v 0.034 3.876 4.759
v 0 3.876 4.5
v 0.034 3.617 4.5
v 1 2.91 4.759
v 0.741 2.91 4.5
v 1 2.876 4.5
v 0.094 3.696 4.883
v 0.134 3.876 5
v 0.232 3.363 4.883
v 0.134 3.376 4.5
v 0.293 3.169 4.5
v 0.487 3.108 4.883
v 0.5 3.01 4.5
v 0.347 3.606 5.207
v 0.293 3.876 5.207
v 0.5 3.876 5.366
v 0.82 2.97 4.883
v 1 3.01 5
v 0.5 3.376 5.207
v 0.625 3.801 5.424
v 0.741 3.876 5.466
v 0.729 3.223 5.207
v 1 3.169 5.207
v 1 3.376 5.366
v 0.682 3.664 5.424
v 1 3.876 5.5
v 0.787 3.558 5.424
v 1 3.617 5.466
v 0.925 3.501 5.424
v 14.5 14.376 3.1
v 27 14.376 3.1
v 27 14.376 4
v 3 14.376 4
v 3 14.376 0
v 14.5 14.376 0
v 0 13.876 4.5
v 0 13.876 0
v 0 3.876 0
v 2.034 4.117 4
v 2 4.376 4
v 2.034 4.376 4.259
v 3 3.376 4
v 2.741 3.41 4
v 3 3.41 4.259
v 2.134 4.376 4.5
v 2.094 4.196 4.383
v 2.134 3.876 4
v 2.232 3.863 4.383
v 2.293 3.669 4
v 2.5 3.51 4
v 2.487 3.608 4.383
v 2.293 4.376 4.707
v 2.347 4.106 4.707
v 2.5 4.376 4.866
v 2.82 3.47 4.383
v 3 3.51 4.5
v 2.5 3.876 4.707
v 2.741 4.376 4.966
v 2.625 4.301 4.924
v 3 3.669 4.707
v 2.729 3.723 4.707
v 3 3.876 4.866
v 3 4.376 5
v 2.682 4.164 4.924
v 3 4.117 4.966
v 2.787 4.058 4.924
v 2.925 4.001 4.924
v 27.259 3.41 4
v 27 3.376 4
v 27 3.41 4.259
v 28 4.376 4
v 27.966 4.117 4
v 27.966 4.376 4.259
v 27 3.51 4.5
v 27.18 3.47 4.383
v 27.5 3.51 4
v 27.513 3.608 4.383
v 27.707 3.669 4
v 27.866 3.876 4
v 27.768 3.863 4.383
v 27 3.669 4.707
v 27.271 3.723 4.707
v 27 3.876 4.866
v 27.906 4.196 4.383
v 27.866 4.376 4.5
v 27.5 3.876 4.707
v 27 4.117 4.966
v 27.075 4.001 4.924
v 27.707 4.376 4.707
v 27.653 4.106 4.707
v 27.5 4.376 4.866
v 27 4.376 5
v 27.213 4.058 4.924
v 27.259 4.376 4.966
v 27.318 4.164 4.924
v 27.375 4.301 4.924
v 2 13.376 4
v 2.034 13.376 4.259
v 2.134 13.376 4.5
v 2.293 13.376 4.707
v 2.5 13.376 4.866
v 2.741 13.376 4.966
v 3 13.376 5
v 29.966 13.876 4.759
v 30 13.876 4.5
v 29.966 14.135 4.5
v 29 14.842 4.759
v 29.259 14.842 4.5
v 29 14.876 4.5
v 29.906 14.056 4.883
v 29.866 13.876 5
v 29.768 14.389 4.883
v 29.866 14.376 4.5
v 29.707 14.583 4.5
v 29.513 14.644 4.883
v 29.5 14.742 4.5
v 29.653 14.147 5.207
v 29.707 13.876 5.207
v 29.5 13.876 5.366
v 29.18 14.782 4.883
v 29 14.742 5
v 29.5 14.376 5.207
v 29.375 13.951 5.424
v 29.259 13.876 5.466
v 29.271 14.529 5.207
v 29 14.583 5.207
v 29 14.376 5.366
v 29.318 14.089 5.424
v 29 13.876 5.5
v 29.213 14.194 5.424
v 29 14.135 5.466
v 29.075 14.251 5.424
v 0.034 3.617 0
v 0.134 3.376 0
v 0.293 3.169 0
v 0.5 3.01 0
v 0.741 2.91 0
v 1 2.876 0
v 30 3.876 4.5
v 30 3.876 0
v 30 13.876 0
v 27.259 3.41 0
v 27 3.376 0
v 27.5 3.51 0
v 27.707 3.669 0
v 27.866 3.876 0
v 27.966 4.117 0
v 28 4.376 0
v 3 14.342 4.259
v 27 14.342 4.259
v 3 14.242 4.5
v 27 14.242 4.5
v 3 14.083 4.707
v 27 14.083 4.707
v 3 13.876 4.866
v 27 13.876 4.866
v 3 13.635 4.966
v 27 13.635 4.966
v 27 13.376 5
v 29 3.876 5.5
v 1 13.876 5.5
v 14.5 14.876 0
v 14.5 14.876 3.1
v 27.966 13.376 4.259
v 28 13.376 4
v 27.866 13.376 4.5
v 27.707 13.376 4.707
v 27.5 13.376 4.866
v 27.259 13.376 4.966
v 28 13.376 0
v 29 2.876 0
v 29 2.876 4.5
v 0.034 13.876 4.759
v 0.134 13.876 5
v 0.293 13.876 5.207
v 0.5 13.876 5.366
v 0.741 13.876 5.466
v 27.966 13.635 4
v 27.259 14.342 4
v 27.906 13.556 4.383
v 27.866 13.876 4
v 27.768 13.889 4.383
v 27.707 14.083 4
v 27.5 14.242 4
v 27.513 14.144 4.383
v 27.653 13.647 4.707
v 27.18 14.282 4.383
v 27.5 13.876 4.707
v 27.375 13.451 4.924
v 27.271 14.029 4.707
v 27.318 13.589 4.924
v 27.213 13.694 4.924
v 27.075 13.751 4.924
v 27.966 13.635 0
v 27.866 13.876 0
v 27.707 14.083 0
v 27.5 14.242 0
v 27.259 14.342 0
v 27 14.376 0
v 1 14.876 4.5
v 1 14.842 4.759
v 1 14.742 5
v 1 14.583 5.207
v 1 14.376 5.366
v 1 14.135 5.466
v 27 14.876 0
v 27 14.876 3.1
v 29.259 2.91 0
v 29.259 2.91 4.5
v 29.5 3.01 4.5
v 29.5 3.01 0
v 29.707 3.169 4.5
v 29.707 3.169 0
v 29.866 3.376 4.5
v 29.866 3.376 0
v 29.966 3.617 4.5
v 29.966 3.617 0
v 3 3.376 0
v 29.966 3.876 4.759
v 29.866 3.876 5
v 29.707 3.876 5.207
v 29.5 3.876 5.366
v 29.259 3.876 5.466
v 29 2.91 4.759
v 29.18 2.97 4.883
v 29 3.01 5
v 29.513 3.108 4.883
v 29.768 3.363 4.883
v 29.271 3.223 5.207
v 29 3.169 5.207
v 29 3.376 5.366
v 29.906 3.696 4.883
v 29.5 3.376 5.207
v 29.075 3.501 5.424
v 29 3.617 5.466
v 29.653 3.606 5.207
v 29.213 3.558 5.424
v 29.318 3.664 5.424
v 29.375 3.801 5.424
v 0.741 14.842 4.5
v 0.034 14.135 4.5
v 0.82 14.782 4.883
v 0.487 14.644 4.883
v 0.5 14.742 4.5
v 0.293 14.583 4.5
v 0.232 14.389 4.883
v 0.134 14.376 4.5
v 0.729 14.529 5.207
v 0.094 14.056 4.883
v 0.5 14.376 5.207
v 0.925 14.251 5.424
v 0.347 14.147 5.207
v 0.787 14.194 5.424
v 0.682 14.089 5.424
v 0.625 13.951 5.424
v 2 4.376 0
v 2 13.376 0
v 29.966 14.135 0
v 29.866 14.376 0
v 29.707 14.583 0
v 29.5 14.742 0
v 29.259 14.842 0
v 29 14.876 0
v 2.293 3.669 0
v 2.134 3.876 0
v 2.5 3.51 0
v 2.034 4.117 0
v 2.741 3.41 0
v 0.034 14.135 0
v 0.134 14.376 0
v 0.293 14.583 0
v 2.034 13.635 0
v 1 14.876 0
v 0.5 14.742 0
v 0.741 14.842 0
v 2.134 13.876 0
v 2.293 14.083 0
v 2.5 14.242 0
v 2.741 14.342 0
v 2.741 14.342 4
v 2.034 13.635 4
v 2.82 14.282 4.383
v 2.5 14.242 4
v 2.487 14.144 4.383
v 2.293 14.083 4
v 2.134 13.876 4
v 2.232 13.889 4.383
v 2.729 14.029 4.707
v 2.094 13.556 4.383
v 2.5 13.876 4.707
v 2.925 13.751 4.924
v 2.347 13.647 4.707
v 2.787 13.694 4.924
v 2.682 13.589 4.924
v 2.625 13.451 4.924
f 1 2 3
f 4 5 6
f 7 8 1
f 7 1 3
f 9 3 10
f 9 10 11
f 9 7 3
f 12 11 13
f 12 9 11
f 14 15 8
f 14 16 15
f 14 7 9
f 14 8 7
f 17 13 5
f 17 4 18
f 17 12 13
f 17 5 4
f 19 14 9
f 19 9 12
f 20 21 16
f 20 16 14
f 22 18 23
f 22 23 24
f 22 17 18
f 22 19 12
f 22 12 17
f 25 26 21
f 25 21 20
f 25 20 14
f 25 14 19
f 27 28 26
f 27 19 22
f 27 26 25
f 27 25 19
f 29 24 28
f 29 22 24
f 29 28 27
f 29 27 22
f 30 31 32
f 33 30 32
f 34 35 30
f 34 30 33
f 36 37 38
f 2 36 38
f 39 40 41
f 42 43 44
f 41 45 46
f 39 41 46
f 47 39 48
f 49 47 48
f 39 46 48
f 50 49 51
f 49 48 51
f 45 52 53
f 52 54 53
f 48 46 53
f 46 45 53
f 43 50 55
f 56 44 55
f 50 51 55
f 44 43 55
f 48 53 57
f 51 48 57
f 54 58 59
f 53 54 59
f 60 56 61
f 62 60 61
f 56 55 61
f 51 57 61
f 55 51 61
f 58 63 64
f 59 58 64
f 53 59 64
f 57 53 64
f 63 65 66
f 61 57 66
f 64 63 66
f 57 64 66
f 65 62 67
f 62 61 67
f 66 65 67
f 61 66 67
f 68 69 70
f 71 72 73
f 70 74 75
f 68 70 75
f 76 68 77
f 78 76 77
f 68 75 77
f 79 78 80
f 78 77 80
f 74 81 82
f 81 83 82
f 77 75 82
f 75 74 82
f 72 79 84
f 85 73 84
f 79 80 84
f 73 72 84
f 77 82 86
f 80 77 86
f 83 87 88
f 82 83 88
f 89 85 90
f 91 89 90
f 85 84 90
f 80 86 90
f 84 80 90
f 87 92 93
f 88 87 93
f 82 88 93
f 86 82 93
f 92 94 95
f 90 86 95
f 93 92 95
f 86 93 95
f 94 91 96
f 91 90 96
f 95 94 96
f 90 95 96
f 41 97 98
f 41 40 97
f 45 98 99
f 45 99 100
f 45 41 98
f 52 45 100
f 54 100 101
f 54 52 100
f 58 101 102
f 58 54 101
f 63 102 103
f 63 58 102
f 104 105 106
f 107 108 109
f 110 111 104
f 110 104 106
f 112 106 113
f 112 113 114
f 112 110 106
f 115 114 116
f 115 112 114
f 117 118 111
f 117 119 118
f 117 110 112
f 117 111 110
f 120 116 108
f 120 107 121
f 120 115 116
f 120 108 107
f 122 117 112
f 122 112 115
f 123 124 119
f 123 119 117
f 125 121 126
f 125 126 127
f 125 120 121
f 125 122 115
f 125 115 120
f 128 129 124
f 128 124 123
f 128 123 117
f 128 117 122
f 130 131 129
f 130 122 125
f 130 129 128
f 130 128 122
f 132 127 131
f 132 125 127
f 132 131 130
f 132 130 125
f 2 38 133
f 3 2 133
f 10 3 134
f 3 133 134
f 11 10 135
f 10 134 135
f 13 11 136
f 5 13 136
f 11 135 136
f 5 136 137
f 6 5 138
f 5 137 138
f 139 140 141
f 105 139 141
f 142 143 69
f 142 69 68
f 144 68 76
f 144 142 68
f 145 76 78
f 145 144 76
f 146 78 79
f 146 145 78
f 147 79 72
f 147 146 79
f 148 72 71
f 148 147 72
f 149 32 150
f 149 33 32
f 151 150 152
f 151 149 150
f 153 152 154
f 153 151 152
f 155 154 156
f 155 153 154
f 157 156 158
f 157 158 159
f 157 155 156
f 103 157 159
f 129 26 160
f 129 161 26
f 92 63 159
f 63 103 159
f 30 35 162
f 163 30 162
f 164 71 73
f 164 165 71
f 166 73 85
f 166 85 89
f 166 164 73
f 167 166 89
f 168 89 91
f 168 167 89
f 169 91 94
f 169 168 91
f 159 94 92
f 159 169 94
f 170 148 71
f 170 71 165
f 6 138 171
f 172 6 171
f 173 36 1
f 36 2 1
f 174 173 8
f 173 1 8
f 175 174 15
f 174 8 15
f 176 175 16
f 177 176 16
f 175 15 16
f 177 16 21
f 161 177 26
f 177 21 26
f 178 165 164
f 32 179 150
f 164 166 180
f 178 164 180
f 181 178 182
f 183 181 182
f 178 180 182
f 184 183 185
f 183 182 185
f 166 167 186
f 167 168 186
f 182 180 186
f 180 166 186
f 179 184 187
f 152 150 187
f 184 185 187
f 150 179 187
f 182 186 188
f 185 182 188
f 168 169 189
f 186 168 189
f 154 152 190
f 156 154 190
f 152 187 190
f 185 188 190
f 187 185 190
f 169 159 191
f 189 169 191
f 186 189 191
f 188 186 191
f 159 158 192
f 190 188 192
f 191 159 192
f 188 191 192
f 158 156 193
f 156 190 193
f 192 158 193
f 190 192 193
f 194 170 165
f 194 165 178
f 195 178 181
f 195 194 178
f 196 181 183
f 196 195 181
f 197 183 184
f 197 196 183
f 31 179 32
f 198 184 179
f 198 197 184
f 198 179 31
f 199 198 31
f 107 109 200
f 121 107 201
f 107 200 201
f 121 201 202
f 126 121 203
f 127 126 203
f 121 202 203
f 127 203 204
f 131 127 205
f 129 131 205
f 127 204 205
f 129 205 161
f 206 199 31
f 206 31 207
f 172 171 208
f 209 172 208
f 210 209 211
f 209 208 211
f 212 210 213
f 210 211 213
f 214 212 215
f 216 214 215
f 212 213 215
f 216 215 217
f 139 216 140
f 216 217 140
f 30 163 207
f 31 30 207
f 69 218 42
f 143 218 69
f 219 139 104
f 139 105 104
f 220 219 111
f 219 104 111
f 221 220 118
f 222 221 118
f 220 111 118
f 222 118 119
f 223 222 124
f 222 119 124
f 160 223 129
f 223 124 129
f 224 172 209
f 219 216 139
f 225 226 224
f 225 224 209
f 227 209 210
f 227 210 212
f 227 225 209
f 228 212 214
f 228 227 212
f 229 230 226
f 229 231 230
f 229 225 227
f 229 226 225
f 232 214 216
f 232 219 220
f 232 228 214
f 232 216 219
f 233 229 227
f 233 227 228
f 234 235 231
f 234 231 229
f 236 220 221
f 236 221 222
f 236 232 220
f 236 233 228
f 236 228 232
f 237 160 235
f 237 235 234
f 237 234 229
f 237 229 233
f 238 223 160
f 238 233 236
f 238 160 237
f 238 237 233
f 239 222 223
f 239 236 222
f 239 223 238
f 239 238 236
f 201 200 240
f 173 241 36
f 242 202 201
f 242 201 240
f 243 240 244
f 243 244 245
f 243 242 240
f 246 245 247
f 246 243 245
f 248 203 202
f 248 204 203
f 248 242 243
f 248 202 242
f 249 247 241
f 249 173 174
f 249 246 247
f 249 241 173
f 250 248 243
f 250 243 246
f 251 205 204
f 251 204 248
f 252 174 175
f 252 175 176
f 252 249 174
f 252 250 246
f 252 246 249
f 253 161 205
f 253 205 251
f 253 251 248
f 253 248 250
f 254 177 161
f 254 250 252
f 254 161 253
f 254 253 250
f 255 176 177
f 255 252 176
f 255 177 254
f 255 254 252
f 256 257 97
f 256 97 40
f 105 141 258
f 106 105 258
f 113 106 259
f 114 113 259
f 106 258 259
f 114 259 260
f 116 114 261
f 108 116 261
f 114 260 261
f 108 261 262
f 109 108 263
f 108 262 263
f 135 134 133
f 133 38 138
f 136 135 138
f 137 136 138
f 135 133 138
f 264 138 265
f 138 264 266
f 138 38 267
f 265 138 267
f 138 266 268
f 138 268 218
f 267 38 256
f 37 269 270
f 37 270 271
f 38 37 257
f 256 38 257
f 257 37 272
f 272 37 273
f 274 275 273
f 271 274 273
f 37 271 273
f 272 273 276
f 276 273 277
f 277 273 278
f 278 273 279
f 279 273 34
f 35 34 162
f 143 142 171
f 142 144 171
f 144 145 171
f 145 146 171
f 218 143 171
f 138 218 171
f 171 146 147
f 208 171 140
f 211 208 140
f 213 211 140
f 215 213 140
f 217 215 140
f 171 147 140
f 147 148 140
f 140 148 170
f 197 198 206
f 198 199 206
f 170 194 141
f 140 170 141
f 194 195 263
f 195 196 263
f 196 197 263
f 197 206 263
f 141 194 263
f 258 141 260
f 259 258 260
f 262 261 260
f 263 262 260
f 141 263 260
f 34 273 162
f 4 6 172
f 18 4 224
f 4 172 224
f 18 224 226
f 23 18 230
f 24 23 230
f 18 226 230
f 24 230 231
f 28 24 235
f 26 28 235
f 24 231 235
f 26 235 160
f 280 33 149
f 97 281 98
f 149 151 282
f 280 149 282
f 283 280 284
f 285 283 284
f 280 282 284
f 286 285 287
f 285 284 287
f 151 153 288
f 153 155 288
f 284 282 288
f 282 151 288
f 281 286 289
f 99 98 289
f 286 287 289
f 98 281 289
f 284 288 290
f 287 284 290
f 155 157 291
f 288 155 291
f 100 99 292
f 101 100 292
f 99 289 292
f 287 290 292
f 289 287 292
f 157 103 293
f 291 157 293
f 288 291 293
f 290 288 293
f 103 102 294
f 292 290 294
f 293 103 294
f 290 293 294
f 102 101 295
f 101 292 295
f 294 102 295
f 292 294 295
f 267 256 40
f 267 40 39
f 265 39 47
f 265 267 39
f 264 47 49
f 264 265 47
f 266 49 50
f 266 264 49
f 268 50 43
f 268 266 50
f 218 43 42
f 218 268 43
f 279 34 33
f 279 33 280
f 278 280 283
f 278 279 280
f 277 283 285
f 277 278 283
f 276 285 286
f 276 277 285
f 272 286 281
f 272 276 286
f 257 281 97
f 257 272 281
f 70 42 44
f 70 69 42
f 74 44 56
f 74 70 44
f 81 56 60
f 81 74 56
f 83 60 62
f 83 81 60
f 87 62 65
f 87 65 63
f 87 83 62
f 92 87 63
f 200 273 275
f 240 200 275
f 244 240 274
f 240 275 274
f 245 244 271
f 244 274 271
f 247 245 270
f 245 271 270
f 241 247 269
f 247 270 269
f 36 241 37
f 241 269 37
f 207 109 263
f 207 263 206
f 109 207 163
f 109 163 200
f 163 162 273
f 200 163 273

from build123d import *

# Parameters (mm, degrees)
F1_DEPTH = 5.5
F2_R     = 1
F4_DEPTH = 5
F5_W     = 12.5
F5_H     = 2.9783394848
F6_DEPTH = 3.1
F7_R     = 1


with BuildPart() as f1:
    # F0 (on Top) → F1 (new body)
    with BuildSketch(Plane.XY):
        with BuildLine():
            ThreePointArc((0, 3.8761399509), (0.2928932188, 3.1690331698), (1, 2.8761399509))
            Line((1, 2.8761399509), (29, 2.8761399509))
            ThreePointArc((29, 2.8761399509), (29.7071067812, 3.1690331698), (30, 3.8761399509))
            Line((30, 3.8761399509), (30, 13.8761399509))
            ThreePointArc((30, 13.8761399509), (29.7071067812, 14.5832467321), (29, 14.8761399509))
            Line((29, 14.8761399509), (1, 14.8761399509))
            ThreePointArc((1, 14.8761399509), (0.2928932188, 14.5832467321), (0, 13.8761399509))
            Line((0, 13.8761399509), (0, 3.8761399509))
        make_face()
    extrude(amount=F1_DEPTH)

    # F2
    f2_edges = [f1.edges().sort_by_distance(p)[0] for p in [
        (0.292893, 3.169033, 5.5),
        (15, 2.87614, 5.5),
        (29.707107, 3.169033, 5.5),
        (30, 8.87614, 5.5),
        (29.707107, 14.583247, 5.5),
        (15, 14.87614, 5.5),
        (0.292893, 14.583247, 5.5),
        (0, 8.87614, 5.5),
    ]]
    fillet(f2_edges, radius=F2_R)

    # F3 (on Top) → F4 (cut)
    with BuildSketch(Plane.XY):
        with BuildLine():
            ThreePointArc((28, 13.3761399509), (27.7071067812, 14.0832467321), (27, 14.3761399509))
            Line((27, 14.3761399509), (3, 14.3761399509))
            ThreePointArc((3, 14.3761399509), (2.2928932188, 14.0832467321), (2, 13.3761399509))
            Line((2, 13.3761399509), (2, 4.3761399509))
            ThreePointArc((2, 4.3761399509), (2.2928932188, 3.6690331698), (3, 3.3761399509))
            Line((3, 3.3761399509), (14.5, 3.3761399509))
            Line((14.5, 3.3761399509), (27, 3.3761399509))
            ThreePointArc((27, 3.3761399509), (27.7071067812, 3.6690331698), (28, 4.3761399509))
            Line((28, 4.3761399509), (28, 13.3761399509))
        make_face()
    extrude(amount=F4_DEPTH, mode=Mode.SUBTRACT)

    # F5 (on Top) → F6 (cut)
    with BuildSketch(Plane.XY):
        with Locations((20.75, 14.7778680548)):
            Rectangle(F5_W, F5_H)
    extrude(amount=F6_DEPTH, mode=Mode.SUBTRACT)

    # F7
    f7_edges = [f1.edges().sort_by_distance(p)[0] for p in [
        (15, 3.37614, 5),
        (28, 8.87614, 5),
        (2.292893, 3.669033, 5),
        (2, 8.87614, 5),
        (15, 14.37614, 5),
        (2.292893, 14.083247, 5),
        (27.707107, 14.083247, 5),
        (27.707107, 3.669033, 5),
    ]]
    fillet(f7_edges, radius=F7_R)


solid = f1.part
